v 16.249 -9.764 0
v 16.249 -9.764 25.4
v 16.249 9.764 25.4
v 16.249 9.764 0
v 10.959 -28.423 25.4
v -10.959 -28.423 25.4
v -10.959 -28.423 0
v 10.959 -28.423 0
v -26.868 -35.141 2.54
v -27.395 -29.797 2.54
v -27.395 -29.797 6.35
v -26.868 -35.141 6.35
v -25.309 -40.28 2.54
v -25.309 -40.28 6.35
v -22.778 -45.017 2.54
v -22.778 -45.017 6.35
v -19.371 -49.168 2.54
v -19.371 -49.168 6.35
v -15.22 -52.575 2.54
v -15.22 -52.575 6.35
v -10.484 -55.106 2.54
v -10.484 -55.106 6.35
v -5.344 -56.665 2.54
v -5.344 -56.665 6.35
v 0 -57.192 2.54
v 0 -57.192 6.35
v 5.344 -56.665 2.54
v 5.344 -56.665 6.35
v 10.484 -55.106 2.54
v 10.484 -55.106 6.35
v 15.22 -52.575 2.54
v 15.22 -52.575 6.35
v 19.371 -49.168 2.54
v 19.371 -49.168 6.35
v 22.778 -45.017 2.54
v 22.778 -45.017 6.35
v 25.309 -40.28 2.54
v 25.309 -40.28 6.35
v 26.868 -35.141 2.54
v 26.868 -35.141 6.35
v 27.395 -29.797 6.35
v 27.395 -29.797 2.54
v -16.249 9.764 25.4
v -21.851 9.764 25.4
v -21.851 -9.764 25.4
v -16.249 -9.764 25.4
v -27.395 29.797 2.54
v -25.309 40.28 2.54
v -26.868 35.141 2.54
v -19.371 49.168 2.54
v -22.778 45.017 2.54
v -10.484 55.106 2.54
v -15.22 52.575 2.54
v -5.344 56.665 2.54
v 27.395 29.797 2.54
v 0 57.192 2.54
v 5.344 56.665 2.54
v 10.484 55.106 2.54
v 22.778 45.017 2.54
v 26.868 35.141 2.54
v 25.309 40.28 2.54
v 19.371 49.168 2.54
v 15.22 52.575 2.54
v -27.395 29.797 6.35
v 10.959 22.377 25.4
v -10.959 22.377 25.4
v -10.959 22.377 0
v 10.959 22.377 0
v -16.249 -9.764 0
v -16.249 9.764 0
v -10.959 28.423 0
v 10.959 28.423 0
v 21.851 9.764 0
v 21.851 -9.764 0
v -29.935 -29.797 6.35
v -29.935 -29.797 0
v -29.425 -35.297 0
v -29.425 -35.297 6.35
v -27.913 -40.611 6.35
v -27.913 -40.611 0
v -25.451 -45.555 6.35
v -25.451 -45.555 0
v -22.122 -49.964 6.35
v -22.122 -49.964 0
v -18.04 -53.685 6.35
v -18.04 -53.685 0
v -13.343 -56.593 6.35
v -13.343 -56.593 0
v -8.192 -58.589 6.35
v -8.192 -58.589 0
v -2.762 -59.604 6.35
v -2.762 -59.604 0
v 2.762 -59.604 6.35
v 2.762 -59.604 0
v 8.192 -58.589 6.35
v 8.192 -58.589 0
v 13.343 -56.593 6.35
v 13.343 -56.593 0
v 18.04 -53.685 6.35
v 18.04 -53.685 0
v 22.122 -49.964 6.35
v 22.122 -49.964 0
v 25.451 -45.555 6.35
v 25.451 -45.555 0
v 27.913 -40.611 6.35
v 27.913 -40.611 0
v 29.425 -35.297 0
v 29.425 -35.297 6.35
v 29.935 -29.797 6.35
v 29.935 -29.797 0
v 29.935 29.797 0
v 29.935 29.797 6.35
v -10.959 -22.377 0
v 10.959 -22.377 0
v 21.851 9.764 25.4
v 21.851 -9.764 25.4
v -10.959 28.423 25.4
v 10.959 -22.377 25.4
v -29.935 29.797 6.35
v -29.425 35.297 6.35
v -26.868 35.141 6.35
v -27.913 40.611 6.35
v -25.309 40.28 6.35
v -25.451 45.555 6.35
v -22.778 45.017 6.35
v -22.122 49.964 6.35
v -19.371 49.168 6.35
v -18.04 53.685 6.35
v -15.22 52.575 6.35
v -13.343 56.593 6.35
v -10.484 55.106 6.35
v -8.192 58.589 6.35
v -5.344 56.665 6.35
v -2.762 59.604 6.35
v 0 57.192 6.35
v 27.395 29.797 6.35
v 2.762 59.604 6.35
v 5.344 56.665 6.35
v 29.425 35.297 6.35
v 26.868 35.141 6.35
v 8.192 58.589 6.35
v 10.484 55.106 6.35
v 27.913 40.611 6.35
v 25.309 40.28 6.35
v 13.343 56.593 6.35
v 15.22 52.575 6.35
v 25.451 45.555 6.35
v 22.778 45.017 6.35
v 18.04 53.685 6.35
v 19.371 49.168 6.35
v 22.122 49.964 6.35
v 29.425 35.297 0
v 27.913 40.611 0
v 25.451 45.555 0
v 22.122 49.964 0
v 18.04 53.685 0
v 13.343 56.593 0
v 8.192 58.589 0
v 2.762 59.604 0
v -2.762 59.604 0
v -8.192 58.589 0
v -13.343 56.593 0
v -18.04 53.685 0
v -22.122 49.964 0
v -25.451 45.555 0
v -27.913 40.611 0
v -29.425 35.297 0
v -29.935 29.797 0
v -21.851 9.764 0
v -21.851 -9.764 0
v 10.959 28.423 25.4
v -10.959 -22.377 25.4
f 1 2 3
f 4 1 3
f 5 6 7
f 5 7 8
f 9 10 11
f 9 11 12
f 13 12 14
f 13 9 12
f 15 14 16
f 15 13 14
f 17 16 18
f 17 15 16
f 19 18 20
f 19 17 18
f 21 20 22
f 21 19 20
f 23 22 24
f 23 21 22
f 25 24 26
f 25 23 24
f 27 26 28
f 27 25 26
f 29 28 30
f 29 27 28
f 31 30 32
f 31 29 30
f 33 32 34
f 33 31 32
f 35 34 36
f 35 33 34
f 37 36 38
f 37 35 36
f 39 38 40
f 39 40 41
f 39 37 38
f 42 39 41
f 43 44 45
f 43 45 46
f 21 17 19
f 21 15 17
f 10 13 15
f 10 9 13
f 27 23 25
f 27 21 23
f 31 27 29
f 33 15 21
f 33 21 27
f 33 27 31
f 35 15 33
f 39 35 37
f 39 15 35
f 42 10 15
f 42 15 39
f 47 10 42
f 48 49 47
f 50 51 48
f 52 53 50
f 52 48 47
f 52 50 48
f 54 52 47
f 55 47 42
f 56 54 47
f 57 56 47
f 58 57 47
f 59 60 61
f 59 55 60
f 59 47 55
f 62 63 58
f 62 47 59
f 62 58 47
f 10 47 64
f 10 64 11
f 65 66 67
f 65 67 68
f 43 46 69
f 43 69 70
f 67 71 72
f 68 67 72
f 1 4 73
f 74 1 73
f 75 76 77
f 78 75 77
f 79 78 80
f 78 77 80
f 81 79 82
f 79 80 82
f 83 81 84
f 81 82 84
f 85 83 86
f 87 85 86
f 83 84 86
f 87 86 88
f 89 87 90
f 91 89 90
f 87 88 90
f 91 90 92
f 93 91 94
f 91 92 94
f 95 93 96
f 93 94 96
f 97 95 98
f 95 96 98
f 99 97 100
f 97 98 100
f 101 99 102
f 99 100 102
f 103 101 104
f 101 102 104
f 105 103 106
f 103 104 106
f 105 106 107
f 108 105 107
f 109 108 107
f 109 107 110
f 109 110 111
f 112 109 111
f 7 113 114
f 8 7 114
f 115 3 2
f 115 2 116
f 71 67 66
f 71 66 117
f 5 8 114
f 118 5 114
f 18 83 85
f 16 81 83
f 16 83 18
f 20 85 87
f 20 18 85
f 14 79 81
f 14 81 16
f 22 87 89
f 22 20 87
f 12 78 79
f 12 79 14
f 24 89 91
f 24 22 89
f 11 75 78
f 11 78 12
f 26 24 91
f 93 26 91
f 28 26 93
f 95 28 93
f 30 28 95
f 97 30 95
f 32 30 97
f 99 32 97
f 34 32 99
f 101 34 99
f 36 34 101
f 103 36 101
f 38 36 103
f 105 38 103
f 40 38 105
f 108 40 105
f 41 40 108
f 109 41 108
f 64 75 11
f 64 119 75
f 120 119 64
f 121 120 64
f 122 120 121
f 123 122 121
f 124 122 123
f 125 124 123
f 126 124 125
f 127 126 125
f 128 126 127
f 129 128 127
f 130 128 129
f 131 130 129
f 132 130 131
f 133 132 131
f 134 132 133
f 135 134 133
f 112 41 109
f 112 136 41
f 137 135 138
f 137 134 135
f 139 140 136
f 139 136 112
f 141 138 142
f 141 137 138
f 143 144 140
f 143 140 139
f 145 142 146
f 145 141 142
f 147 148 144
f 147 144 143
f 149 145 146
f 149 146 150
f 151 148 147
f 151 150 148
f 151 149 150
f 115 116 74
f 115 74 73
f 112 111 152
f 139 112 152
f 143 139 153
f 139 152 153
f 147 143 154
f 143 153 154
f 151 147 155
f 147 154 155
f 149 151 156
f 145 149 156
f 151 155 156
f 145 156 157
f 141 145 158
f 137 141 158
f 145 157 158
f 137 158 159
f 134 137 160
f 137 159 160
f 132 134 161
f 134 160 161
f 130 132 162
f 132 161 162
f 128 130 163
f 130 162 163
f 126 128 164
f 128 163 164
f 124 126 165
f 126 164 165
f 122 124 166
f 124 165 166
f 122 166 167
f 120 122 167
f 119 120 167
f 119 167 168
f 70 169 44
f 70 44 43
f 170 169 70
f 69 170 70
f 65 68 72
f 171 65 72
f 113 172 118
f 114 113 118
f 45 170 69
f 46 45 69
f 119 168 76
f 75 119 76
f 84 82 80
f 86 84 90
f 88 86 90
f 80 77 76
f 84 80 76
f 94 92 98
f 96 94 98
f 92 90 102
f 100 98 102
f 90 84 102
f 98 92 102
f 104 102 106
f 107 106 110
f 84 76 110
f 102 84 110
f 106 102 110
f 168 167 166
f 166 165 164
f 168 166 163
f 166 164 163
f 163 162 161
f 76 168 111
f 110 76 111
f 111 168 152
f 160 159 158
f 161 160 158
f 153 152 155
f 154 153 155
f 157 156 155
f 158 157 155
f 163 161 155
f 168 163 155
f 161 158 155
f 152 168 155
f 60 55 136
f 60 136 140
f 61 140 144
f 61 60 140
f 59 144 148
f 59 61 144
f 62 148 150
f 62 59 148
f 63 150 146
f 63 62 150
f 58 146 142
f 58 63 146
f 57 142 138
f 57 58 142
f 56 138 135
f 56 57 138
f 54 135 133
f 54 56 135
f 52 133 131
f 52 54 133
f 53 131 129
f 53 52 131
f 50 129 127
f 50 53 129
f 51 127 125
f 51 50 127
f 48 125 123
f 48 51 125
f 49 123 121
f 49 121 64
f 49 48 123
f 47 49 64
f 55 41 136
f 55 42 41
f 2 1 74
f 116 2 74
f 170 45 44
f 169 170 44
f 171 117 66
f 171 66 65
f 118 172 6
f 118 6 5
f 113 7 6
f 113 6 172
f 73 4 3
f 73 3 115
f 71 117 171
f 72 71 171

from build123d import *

# Parameters (mm, degrees)
F1_W     = 21.917364
F1_H     = 6.045704
F1_W_2   = 5.601654
F1_H_2   = 19.527208
F2_DEPTH = 25.4
F3_DEPTH = 6.35
F4_T     = -2.54


with BuildPart() as f2:
    # F1 (on face) → F2 (new body)
    with BuildSketch(Plane.XY):
        with Locations((0, 25.4)):
            Rectangle(F1_W, F1_H)
        with Locations((0, -25.4)):
            Rectangle(F1_W, F1_H)
        with Locations((-19.05, 0)):
            Rectangle(F1_W_2, F1_H_2)
        with Locations((19.05, 0)):
            Rectangle(F1_W_2, F1_H_2)
    extrude(amount=F2_DEPTH)


with BuildPart() as f3:
    # F0 (on Top) → F3 (new body)
    with BuildSketch(Plane.XY):
        with BuildLine():
            ThreePointArc((29.934777, 29.796828), (0, 59.731605), (-29.934777, 29.796828))
            Line((-29.934777, 29.796828), (-29.934777, -29.796828))
            ThreePointArc((-29.934777, -29.796828), (0, -59.731605), (29.934777, -29.796828))
            Line((29.934777, -29.796828), (29.934777, 29.796828))
        make_face()
    extrude(amount=F3_DEPTH)

    # F4
    f4_openings = [f3.faces().sort_by_distance(p)[0] for p in [
        (0, 0, 6.35),
    ]]
    offset(amount=F4_T, openings=f4_openings)


solid = Compound([f2.part, f3.part])
